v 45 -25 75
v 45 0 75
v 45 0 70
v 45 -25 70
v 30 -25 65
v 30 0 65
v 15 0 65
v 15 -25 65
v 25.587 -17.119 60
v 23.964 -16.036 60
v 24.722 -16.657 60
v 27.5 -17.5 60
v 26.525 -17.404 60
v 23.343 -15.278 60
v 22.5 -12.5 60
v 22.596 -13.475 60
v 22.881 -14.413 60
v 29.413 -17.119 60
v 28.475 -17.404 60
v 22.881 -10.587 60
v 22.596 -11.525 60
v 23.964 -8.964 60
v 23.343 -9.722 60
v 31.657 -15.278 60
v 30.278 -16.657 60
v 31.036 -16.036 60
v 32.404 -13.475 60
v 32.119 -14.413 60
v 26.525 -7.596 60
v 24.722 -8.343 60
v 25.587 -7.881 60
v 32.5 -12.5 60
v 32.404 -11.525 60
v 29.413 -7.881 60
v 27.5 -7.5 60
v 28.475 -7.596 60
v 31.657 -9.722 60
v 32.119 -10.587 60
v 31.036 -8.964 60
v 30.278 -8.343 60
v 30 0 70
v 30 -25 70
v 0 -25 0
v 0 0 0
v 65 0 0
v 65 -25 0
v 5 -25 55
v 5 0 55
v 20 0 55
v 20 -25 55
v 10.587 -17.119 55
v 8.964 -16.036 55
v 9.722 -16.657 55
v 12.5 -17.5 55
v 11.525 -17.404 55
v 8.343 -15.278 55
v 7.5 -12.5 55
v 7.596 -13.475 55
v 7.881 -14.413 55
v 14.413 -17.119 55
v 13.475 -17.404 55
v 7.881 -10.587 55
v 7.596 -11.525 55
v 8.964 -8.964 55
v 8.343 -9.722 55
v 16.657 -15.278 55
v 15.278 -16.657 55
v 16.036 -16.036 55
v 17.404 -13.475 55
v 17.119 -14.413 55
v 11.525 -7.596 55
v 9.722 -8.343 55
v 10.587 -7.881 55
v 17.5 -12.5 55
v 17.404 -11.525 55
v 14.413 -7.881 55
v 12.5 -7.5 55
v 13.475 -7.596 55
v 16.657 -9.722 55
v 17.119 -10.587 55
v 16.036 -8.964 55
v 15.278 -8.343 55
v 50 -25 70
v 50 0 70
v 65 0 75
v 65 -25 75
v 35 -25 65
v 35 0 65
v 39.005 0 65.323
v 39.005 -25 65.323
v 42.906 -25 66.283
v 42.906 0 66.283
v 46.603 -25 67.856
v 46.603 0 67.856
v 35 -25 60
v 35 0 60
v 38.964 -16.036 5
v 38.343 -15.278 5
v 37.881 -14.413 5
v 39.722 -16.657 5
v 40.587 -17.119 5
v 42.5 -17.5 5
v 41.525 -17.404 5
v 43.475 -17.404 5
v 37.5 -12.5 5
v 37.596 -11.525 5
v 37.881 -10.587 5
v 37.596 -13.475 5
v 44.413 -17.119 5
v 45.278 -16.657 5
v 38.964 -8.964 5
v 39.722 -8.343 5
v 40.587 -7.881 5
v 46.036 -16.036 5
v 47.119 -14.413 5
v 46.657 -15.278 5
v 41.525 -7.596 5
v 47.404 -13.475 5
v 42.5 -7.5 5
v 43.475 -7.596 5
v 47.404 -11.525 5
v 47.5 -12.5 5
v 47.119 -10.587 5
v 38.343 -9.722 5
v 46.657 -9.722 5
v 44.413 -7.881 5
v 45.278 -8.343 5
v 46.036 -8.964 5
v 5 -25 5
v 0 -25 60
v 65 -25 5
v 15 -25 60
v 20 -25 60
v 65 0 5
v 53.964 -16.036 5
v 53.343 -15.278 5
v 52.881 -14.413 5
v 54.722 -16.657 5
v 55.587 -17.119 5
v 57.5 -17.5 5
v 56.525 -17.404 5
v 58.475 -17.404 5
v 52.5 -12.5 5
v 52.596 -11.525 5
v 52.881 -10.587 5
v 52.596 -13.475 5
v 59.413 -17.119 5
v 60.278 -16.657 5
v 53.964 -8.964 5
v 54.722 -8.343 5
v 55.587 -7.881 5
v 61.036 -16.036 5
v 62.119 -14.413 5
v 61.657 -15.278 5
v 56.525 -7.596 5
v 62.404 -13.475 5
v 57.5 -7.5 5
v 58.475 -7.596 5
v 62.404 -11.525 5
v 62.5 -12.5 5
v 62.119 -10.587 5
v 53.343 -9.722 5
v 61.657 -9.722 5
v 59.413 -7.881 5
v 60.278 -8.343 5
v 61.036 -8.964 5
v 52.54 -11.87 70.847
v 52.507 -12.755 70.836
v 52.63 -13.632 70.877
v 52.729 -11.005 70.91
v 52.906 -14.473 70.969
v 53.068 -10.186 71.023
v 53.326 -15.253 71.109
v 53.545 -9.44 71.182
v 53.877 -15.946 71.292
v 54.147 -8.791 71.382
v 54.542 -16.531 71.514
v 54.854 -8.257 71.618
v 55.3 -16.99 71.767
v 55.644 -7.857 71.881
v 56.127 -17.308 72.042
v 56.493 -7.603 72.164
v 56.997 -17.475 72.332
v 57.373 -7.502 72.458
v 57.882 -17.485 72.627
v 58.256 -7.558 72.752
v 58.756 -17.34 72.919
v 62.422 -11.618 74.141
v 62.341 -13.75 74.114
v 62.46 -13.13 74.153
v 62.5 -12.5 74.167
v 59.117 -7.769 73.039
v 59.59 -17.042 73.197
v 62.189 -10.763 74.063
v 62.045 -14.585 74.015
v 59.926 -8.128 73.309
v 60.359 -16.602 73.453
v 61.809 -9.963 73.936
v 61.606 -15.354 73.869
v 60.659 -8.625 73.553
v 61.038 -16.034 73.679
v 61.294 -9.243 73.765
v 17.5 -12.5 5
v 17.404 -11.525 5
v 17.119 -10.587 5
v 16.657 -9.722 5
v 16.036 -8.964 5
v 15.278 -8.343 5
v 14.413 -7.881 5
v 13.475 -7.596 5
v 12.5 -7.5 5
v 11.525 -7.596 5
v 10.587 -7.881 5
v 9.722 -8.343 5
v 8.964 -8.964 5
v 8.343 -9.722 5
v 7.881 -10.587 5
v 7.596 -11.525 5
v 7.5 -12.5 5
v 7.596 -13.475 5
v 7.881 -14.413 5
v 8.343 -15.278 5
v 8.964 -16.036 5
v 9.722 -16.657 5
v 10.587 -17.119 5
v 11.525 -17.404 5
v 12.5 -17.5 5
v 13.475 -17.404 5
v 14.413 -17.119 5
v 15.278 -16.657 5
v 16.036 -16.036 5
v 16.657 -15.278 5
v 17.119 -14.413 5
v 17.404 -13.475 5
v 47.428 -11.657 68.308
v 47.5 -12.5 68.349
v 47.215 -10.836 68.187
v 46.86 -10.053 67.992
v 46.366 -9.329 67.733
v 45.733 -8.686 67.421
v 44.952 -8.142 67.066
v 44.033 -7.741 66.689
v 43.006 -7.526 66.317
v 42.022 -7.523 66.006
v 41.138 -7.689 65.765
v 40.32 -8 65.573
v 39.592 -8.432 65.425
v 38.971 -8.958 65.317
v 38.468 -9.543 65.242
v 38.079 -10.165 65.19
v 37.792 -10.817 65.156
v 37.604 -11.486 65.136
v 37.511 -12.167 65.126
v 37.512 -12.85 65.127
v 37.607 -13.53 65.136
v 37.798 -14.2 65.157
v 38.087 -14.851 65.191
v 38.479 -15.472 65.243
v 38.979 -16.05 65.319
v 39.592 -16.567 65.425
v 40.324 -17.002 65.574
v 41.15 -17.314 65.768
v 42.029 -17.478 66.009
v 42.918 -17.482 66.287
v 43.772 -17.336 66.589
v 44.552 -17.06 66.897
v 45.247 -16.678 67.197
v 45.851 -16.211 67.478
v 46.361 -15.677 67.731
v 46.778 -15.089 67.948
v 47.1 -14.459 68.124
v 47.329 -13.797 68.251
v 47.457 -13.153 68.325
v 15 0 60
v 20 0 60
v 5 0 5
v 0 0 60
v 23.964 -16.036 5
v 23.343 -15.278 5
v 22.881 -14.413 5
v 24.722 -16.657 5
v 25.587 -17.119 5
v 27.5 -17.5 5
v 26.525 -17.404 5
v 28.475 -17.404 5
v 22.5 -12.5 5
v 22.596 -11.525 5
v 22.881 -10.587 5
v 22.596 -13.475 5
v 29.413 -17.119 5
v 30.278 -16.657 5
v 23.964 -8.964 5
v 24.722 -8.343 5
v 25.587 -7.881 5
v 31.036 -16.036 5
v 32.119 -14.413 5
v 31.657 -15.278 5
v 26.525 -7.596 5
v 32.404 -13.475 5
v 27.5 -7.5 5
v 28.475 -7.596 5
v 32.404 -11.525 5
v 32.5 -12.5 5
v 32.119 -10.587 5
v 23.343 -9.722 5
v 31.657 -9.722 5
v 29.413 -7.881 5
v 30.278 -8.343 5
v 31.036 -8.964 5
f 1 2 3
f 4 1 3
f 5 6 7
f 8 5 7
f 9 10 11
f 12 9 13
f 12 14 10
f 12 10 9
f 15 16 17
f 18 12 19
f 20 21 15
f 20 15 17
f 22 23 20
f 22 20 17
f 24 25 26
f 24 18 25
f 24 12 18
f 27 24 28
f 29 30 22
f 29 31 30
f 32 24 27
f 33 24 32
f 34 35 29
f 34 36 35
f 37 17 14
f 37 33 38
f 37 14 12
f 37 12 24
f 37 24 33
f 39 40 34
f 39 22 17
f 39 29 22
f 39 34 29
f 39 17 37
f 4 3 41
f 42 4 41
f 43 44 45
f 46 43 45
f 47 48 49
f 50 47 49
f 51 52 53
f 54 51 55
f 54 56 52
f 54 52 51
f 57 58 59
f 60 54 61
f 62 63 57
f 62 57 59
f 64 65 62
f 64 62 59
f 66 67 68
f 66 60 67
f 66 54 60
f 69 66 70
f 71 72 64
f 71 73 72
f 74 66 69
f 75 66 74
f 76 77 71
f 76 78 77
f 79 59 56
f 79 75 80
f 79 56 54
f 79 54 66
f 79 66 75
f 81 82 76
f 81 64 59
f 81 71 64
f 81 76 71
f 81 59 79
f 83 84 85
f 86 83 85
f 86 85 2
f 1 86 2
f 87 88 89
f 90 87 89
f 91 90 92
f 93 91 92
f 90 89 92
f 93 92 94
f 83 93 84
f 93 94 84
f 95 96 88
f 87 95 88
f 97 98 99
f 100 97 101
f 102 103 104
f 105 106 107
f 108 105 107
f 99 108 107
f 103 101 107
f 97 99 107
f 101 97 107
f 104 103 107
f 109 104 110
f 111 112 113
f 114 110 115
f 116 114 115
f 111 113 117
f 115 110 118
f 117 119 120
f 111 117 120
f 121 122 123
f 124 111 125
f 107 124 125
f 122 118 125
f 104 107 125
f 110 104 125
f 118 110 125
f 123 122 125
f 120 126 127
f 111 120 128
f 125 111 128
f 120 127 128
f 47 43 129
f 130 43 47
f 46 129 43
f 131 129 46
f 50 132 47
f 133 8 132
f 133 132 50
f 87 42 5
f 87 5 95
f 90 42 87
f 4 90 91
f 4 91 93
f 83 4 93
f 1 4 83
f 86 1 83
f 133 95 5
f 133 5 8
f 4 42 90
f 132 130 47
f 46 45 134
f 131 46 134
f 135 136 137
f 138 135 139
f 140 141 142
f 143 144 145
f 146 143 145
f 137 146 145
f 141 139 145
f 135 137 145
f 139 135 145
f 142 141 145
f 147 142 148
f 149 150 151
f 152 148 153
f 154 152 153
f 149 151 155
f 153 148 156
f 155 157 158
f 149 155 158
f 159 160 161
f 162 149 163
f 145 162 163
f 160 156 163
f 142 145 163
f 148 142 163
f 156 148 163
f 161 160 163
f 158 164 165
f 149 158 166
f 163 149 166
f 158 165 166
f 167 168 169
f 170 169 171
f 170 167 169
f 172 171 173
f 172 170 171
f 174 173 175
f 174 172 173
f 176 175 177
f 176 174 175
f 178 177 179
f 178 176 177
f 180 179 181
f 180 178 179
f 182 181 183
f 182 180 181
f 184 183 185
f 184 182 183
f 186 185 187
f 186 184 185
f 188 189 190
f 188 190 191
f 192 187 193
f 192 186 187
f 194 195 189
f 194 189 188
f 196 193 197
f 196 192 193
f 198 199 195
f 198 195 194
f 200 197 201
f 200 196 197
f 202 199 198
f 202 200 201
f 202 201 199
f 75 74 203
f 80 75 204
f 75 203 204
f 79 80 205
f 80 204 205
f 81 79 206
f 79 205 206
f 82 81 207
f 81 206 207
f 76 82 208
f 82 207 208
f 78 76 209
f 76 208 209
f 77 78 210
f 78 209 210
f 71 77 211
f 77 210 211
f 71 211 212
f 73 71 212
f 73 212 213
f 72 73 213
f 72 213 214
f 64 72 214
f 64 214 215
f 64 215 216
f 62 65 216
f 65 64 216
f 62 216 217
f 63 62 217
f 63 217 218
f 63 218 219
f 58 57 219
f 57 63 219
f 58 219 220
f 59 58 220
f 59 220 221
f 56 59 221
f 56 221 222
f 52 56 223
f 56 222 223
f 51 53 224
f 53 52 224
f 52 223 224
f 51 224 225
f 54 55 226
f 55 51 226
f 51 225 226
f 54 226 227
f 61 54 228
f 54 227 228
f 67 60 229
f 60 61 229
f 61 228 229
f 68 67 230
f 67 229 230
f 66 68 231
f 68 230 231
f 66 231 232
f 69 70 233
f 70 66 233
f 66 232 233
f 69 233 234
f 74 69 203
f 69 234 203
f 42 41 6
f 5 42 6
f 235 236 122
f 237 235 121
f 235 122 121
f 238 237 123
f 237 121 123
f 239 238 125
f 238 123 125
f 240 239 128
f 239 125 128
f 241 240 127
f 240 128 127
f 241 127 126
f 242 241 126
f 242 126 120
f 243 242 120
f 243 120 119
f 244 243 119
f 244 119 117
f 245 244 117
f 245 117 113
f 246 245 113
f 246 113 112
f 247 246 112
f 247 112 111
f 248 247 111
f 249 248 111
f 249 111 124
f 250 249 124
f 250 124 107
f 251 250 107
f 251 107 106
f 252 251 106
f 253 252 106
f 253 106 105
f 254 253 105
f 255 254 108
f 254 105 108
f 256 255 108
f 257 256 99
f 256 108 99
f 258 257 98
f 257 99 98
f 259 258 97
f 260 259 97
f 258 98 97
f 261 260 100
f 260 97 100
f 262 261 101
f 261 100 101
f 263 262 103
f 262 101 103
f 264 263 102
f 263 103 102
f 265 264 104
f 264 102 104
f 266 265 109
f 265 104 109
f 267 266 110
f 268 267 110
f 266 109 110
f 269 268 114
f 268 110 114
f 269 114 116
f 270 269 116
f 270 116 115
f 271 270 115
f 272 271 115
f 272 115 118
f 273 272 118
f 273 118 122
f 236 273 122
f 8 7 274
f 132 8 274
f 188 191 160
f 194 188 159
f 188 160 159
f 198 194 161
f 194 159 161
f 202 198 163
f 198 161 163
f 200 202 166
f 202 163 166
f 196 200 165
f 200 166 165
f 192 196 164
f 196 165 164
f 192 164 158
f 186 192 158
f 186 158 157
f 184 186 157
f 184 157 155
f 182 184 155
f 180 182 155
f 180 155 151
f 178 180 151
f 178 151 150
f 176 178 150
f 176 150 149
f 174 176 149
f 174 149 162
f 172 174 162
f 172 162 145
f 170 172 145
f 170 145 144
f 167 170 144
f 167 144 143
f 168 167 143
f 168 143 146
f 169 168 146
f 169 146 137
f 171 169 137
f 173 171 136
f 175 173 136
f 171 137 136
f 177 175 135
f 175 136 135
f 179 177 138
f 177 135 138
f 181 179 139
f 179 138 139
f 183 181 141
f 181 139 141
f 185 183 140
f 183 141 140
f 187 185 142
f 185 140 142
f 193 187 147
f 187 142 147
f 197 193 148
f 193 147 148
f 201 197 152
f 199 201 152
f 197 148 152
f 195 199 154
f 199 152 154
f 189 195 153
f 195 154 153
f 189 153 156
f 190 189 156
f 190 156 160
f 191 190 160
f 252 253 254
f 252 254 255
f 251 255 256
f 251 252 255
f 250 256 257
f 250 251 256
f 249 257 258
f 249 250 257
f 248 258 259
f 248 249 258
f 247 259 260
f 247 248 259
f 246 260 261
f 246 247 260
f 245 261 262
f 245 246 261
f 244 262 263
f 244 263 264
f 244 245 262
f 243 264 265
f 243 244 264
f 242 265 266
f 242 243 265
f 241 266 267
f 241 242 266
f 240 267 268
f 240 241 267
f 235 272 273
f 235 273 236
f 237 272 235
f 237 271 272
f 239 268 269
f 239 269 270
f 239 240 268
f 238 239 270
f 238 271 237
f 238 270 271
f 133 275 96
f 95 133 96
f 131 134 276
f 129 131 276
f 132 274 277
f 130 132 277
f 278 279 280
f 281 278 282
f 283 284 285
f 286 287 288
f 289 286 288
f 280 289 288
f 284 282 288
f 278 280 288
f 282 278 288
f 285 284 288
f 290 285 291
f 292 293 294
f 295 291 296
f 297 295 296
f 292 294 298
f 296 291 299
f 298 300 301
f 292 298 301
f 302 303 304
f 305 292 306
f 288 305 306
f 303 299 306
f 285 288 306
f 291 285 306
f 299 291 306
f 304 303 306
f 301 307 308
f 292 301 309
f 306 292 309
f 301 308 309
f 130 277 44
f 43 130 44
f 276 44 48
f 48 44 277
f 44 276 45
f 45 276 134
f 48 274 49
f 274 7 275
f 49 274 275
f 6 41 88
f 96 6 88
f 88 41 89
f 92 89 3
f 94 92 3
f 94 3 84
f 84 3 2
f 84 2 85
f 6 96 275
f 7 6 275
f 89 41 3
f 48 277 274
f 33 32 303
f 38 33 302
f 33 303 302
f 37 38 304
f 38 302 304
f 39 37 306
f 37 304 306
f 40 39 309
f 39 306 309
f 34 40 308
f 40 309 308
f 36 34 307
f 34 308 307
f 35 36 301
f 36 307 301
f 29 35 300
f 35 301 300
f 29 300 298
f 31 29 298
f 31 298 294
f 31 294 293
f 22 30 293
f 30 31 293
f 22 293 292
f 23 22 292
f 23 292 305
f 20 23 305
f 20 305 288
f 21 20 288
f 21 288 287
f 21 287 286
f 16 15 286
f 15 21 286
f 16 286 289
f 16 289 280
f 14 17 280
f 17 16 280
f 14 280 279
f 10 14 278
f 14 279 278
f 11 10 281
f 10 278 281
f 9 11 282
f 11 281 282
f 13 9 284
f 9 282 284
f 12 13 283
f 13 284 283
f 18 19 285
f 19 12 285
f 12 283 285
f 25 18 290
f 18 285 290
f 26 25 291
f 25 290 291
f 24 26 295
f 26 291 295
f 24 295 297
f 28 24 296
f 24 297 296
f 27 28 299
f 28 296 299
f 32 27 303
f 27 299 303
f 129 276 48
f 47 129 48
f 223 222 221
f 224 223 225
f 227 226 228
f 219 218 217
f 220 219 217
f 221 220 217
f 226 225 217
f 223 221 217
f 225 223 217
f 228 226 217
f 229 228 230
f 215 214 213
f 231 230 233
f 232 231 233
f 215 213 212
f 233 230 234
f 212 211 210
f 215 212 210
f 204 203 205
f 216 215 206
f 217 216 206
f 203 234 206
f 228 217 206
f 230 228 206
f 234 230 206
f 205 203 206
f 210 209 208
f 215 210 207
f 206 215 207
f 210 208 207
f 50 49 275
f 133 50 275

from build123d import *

# Parameters (mm, degrees)
F0_W     = 5
F0_H     = 50
F1_DEPTH = 25
F2_R     = 5


with BuildPart() as f1:
    # F0 (on Front) → F1 (new body)
    with BuildSketch(Plane.XZ):
        Polygon((0, 5), (0, 0), (65, 0), (65, 5), (5, 5), align=None)
        with Locations((2.5, 30)):
            Rectangle(F0_W, F0_H)
        with BuildLine():
            Line((0, 60), (0, 55))
            Line((0, 55), (5, 55))
            Line((5, 55), (20, 55))
            Line((20, 55), (20, 60))
            Line((20, 60), (35, 60))
            Line((35, 60), (35, 65))
            ThreePointArc((35, 65), (42.9056941504, 66.2829175487), (50, 70))
            Line((50, 70), (65, 75))
            Line((65, 75), (45, 75))
            Line((45, 75), (45, 70))
            Line((45, 70), (30, 70))
            Line((30, 70), (30, 65))
            Line((30, 65), (15, 65))
            Line((15, 65), (15, 60))
            Line((15, 60), (0, 60))
        make_face()
    extrude(amount=F1_DEPTH)


with BuildPart() as f3:
    # F2 (on face) → F3 (new body, up to the next surface of F1)
    with BuildSketch(Plane.XY.offset(5)):
        with Locations((12.5, -12.5)):
            Circle(F2_R)
    extrude(until=Until.NEXT, target=f1.part)


with BuildPart() as f3b:
    # F2 (on face) → F3, piece 2 (new body, up to the next surface of F1)
    with BuildSketch(Plane.XY.offset(5)):
        with Locations((27.5, -12.5)):
            Circle(F2_R)
    extrude(until=Until.NEXT, target=f1.part)


with BuildPart() as f3c:
    # F2 (on face) → F3, piece 3 (new body, up to the next surface of F1)
    with BuildSketch(Plane.XY.offset(5)):
        with Locations((42.5, -12.5)):
            Circle(F2_R)
    extrude(until=Until.NEXT, target=f1.part)


with BuildPart() as f3d:
    # F2 (on face) → F3, piece 4 (new body, up to the next surface of F1)
    with BuildSketch(Plane.XY.offset(5)):
        with Locations((57.5, -12.5)):
            Circle(F2_R)
    extrude(until=Until.NEXT, target=f1.part)


solid = Compound([f1.part, f3.part, f3b.part, f3c.part, f3d.part])
